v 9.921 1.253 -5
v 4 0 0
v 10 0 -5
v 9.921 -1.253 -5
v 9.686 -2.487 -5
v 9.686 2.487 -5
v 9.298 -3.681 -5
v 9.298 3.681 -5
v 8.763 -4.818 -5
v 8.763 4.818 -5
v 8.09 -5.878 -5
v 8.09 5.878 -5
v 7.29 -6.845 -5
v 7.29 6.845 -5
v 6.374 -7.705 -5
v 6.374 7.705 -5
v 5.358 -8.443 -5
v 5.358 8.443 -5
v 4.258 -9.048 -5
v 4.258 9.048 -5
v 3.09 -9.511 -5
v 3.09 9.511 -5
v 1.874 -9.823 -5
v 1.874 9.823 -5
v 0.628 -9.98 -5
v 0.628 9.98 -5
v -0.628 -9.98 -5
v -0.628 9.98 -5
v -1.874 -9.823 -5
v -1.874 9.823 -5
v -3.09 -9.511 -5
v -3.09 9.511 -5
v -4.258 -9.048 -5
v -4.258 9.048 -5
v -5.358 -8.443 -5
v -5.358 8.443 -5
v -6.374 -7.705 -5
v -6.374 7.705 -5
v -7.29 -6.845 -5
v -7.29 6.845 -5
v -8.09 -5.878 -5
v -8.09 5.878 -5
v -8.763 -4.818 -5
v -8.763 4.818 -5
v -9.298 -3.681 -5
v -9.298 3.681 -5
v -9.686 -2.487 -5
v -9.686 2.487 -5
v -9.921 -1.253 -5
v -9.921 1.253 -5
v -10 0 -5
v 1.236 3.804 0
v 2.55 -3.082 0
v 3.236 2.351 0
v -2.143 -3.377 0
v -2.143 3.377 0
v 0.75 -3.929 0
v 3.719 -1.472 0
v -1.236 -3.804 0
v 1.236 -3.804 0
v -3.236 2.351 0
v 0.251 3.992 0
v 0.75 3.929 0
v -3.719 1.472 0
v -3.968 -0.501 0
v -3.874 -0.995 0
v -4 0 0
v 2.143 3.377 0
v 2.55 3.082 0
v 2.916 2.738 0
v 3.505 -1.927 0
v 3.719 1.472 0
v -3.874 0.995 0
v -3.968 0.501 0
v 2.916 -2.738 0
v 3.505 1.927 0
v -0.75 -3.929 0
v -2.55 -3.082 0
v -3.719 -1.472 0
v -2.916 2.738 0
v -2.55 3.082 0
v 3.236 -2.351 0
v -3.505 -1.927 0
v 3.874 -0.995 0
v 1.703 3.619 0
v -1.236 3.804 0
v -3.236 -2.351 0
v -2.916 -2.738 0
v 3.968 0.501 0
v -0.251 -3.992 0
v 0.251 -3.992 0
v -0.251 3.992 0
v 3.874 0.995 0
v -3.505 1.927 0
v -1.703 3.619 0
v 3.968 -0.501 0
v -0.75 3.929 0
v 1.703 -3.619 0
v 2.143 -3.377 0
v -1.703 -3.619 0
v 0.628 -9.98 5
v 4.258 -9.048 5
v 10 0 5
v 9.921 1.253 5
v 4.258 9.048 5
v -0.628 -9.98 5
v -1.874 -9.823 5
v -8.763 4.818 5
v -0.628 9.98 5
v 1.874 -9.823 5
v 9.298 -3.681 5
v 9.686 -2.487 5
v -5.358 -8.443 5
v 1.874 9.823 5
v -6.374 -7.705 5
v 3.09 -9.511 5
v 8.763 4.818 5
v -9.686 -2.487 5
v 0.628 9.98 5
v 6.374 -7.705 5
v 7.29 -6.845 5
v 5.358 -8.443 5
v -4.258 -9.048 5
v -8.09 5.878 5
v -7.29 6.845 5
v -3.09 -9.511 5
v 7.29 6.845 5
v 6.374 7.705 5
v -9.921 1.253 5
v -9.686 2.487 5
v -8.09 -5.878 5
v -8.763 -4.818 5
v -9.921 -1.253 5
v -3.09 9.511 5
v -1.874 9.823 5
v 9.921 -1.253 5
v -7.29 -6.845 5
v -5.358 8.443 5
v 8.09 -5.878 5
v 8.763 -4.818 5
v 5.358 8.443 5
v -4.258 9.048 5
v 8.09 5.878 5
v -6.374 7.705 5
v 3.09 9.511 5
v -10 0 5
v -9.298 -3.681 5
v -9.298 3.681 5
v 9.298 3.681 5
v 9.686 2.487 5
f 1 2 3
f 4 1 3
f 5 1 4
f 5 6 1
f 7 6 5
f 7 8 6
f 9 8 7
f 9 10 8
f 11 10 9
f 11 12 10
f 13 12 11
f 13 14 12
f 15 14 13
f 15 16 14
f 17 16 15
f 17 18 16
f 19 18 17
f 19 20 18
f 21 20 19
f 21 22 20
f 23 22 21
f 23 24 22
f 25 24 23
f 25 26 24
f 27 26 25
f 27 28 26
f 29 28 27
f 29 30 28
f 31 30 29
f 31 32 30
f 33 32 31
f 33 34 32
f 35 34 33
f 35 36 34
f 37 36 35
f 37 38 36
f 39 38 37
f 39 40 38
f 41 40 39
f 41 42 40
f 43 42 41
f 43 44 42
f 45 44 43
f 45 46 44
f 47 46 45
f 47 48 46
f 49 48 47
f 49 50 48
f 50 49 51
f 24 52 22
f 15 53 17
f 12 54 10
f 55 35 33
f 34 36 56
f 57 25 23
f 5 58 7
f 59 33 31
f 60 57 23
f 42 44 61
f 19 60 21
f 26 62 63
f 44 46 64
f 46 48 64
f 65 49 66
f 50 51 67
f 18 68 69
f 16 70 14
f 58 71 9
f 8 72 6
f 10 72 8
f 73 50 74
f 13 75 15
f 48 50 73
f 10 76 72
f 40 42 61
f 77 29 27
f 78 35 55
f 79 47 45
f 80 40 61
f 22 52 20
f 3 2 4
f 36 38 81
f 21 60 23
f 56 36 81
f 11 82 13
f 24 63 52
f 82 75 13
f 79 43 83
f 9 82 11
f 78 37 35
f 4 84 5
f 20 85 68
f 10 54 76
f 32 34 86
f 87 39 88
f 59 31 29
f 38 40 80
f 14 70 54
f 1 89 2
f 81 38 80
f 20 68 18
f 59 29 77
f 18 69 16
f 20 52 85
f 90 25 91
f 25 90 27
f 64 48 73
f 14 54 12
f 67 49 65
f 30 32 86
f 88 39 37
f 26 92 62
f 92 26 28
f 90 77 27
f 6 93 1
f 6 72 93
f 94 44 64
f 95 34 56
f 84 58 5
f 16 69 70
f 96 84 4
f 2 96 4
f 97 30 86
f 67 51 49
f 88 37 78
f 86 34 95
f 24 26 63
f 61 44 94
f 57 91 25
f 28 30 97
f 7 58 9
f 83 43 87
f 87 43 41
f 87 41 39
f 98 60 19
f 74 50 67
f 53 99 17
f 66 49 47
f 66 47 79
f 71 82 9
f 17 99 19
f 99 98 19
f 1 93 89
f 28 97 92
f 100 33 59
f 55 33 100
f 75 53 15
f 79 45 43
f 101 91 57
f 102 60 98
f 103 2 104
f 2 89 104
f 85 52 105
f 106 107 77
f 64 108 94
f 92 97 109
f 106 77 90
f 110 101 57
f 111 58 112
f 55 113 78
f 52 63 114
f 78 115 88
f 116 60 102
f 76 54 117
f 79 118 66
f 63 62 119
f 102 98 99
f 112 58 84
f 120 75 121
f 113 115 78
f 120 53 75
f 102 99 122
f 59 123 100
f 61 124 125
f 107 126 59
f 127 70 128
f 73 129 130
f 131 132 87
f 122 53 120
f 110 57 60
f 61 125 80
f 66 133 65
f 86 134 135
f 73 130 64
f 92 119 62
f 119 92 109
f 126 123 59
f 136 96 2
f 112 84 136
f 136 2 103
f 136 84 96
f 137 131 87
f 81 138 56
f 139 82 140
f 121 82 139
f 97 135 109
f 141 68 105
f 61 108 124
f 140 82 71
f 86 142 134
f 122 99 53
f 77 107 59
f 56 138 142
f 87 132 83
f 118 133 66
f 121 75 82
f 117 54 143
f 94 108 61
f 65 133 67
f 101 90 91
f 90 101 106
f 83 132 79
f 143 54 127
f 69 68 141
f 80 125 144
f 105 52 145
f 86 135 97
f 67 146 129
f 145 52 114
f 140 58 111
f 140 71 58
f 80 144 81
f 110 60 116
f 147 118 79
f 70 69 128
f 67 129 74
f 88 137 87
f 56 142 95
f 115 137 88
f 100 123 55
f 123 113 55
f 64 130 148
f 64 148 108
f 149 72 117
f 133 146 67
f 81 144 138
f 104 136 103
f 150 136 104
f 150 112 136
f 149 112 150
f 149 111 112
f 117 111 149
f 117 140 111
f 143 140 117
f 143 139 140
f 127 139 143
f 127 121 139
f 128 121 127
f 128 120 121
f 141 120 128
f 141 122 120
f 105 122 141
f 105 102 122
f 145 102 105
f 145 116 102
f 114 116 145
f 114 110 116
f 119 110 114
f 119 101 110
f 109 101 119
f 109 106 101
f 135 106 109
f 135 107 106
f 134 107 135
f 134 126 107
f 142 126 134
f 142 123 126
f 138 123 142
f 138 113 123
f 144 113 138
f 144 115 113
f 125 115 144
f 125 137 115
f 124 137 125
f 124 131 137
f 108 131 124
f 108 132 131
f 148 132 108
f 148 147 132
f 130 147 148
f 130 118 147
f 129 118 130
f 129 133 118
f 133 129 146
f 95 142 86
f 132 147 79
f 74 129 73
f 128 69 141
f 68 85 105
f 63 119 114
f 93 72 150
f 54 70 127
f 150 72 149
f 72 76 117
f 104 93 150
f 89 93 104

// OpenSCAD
$fn=50;
union() {
  translate([0, 0, -2.5]) {
    cylinder(r1=10, r2=4, h=5, center=true);
  }
  translate([0, 0, 2.5]) {
    cylinder(r1=4, r2=10, h=5, center=true);
  }
}
